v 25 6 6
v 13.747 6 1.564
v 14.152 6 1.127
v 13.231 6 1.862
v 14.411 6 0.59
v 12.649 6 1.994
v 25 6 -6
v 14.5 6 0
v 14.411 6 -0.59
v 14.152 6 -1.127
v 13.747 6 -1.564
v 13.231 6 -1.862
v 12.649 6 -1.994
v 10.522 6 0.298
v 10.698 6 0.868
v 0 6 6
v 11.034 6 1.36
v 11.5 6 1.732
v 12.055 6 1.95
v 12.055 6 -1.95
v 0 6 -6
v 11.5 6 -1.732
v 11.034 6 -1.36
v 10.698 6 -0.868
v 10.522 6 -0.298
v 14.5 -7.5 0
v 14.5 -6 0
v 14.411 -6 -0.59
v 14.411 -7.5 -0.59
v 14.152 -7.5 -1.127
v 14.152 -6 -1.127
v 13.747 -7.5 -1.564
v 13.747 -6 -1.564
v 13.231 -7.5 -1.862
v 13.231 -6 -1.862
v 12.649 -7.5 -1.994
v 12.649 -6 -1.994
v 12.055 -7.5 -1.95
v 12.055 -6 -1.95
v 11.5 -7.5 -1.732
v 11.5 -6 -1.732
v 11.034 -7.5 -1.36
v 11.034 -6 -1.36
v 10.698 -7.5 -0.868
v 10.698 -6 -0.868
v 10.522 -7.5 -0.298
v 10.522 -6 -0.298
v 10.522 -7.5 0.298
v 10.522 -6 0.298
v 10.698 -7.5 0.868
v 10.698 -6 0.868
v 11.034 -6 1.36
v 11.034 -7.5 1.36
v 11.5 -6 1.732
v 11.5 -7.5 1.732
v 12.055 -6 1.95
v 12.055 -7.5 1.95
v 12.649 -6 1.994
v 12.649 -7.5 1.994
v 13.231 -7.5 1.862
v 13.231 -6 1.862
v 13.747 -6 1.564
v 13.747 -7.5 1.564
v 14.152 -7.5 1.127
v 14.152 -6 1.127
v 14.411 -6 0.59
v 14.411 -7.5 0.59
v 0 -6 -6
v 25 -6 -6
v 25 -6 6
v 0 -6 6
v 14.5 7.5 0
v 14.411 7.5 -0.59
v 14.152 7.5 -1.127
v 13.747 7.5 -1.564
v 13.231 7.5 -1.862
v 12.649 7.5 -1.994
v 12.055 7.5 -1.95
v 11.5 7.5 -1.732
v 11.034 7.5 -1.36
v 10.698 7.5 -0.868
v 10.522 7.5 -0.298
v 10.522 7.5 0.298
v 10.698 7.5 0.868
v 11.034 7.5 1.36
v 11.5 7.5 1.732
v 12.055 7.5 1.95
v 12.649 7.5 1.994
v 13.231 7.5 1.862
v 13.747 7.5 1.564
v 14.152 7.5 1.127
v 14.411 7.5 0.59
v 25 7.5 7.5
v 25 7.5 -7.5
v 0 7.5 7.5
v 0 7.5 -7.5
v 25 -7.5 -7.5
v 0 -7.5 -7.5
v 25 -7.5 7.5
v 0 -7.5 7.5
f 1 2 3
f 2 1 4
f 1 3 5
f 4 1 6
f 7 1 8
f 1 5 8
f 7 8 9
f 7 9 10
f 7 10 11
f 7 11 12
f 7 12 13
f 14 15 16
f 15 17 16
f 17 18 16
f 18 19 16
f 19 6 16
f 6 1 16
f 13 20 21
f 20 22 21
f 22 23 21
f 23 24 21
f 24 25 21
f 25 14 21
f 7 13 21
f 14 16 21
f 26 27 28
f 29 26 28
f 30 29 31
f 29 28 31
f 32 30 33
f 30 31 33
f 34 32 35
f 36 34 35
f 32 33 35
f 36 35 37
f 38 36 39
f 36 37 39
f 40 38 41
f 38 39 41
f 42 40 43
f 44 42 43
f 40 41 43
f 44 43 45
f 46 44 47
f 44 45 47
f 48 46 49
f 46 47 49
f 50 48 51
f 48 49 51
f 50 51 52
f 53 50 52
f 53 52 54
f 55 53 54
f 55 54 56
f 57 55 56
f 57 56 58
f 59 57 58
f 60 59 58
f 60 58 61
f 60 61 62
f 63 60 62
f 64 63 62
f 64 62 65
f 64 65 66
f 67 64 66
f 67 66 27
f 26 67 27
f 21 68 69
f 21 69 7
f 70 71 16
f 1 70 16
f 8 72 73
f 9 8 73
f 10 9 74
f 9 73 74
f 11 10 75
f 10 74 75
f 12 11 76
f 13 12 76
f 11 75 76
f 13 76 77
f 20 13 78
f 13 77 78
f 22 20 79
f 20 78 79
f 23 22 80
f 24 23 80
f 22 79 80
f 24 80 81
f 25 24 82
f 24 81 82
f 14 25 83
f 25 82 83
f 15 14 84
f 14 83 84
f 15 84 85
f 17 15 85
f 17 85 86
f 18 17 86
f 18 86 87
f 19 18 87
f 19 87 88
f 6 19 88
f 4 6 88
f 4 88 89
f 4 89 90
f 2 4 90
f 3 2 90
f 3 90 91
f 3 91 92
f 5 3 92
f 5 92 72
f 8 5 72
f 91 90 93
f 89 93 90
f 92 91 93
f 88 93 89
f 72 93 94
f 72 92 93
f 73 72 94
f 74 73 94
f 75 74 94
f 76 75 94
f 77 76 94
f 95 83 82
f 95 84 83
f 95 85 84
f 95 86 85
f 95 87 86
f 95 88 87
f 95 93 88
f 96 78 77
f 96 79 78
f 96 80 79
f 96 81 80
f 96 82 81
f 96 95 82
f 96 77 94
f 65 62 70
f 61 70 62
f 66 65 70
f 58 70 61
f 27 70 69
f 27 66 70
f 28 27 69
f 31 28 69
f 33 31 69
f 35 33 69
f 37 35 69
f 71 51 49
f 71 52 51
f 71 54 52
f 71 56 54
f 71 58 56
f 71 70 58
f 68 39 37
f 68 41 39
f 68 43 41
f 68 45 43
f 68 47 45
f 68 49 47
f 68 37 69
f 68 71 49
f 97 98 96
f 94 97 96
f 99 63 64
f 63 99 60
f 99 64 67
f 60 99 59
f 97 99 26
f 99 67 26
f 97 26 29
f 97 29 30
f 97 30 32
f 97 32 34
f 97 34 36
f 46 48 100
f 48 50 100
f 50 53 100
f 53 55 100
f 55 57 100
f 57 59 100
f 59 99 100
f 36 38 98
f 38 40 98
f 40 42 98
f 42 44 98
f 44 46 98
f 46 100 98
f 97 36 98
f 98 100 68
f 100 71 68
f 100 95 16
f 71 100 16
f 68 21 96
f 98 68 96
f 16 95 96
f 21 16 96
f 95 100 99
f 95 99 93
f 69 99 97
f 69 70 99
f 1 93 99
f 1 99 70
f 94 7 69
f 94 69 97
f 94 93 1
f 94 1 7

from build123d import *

# Parameters (mm, degrees)
SKETCH1_W           = 15
SKETCH1_H           = 15
SKETCH1_W_2         = 12
SKETCH1_H_2         = 12
BOSS_EXTRUDE1_DEPTH = 25
SKETCH2_R           = 2
CUT_EXTRUDE1_DEPTH  = 16


with BuildPart() as part:
    # Sketch1 → Boss-Extrude1 (new body)
    with BuildSketch(Plane(origin=(0, 0, 0), x_dir=(0, 0, -1), z_dir=(1, 0, 0))):
        Rectangle(SKETCH1_W, SKETCH1_H)
        Rectangle(SKETCH1_W_2, SKETCH1_H_2, mode=Mode.SUBTRACT)
    extrude(amount=BOSS_EXTRUDE1_DEPTH)

    # Sketch2 → Cut-Extrude1 (cut, through all)
    with BuildSketch(Plane(origin=(0, 7.5, 0), x_dir=(1, 0, 0), z_dir=(0, 1, 0))):
        with Locations((12.5, 0)):
            Circle(SKETCH2_R)
    extrude(amount=-CUT_EXTRUDE1_DEPTH, mode=Mode.SUBTRACT)


solid = part.part
